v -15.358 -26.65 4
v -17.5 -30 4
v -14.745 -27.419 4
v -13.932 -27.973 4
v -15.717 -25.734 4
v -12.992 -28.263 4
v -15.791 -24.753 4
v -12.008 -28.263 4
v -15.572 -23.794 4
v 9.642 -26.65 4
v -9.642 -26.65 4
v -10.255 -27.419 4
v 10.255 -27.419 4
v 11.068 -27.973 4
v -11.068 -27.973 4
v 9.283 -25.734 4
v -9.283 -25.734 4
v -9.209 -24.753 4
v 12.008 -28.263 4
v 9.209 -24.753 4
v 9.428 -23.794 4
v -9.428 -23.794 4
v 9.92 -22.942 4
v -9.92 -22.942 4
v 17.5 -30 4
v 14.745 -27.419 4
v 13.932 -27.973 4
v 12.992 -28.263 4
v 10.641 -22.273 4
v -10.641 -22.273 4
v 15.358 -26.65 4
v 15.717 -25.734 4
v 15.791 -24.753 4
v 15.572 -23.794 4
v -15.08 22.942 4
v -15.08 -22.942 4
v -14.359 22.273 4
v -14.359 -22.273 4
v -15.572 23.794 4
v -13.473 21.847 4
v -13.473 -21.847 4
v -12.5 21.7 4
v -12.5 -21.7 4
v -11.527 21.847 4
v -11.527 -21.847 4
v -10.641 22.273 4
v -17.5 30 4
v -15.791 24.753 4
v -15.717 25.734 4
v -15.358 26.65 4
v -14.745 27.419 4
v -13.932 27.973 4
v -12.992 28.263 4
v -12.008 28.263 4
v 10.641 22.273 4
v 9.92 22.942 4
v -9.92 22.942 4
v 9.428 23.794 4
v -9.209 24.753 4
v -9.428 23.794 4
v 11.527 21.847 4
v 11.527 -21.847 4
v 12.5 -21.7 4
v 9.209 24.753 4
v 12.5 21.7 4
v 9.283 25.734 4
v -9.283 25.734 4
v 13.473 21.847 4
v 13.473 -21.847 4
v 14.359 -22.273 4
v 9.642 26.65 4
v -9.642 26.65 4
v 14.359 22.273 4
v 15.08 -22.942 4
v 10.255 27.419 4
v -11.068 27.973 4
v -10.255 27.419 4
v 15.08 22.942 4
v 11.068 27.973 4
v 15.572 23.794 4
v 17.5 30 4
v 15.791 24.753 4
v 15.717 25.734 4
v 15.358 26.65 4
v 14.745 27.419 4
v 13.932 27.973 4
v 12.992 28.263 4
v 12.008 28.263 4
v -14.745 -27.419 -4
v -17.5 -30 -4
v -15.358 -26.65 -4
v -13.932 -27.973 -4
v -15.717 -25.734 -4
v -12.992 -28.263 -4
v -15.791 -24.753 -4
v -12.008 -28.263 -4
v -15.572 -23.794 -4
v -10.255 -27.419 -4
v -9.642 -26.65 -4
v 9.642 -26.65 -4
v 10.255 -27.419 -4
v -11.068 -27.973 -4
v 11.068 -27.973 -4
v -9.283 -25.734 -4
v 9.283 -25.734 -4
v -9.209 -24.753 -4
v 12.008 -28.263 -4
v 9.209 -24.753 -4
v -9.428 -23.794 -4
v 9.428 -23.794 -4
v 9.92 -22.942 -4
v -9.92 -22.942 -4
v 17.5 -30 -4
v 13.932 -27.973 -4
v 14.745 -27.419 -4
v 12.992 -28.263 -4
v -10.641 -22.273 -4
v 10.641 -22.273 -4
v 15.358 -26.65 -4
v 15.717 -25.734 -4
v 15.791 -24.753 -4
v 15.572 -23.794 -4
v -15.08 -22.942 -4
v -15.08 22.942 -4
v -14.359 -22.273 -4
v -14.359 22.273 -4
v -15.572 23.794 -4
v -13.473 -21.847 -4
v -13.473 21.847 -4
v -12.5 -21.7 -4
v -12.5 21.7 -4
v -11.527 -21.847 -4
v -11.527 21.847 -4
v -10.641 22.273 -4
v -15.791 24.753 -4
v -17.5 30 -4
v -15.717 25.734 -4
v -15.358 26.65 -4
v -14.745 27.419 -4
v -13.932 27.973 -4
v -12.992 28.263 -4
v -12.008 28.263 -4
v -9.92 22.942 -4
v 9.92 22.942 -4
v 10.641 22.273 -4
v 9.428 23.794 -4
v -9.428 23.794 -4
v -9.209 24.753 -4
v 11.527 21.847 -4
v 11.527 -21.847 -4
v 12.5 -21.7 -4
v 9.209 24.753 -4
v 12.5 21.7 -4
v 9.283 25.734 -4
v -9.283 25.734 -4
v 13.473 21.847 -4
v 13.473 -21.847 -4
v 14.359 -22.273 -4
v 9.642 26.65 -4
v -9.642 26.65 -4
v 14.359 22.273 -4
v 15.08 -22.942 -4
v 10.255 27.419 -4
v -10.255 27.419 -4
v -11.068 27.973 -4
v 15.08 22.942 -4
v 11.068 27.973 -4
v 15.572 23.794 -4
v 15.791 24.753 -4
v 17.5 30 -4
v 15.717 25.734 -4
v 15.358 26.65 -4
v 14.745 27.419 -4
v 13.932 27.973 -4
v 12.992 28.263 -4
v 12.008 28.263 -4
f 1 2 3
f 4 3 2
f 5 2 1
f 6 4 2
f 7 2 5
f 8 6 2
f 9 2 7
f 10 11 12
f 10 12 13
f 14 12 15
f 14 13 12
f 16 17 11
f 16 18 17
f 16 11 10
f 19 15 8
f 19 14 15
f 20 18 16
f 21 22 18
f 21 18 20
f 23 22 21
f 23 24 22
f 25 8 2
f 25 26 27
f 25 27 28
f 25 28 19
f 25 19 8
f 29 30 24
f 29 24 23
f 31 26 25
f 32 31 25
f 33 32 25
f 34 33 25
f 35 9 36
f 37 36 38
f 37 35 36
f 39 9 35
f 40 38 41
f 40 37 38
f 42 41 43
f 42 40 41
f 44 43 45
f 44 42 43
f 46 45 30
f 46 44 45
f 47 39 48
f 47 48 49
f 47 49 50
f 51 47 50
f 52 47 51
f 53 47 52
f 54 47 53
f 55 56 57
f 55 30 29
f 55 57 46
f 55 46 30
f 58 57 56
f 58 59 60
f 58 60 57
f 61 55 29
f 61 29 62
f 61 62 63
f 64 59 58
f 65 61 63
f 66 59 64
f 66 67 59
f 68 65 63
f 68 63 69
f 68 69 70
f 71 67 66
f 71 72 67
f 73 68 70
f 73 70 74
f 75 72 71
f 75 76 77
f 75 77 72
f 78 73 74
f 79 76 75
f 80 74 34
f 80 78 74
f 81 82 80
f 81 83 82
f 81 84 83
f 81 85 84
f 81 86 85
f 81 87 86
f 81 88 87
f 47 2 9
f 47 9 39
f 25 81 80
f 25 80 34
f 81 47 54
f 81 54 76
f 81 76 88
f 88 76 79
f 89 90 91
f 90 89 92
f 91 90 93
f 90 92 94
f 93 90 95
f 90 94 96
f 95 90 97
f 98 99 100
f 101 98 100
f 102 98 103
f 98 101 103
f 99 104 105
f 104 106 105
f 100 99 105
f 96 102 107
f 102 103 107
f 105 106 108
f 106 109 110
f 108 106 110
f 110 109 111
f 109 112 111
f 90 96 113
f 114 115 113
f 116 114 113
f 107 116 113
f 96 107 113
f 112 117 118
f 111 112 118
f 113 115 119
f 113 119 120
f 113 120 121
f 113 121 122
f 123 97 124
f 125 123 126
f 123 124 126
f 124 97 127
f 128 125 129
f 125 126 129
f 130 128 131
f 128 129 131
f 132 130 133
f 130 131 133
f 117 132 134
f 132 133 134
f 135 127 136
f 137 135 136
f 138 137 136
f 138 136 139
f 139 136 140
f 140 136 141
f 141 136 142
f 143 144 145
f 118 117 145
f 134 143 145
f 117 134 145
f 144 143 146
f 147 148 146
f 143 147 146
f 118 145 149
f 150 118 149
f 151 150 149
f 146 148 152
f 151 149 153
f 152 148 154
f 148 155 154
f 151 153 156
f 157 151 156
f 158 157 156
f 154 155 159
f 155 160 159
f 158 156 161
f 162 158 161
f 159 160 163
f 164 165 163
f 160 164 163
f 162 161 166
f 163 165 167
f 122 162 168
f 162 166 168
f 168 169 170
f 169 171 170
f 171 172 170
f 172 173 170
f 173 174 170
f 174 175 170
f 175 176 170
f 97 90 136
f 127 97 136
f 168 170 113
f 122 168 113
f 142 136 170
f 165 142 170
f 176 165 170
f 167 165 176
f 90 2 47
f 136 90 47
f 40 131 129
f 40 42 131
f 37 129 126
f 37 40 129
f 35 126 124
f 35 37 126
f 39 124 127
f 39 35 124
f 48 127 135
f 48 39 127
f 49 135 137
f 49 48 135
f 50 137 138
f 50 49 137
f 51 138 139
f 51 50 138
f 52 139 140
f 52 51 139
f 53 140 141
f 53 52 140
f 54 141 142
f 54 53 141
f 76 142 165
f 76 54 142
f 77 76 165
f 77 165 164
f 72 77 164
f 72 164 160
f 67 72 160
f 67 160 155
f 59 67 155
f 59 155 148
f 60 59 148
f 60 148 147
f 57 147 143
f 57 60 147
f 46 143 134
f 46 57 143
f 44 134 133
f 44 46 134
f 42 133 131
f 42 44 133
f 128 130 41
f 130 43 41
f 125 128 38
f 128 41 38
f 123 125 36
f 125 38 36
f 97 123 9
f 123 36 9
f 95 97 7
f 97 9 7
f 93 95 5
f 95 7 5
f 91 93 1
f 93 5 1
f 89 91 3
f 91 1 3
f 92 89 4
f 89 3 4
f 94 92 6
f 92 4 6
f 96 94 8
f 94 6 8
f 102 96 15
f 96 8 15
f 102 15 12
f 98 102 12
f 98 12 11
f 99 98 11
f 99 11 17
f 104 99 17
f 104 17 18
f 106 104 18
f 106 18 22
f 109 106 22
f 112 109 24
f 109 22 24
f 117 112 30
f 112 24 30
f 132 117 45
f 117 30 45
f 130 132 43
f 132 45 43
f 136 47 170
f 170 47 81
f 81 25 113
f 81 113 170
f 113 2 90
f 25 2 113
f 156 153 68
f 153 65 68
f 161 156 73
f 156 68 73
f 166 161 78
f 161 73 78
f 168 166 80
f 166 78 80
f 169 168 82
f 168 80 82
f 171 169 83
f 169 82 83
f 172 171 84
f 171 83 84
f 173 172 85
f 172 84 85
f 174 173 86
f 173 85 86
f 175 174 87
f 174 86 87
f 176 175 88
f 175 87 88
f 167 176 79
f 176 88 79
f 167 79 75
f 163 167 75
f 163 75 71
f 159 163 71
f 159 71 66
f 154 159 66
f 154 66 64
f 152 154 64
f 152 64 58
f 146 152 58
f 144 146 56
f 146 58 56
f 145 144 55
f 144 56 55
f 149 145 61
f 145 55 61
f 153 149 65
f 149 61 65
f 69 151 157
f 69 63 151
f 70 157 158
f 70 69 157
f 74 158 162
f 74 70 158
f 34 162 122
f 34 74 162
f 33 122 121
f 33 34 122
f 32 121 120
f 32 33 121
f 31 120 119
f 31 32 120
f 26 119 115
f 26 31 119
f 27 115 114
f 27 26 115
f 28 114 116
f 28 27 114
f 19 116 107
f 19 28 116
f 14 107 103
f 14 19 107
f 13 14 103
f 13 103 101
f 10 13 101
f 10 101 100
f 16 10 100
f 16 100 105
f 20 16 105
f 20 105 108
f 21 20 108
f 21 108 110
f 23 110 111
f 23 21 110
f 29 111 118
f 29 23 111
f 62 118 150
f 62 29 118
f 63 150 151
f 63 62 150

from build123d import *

# Parameters (mm, degrees)
SKETCH1_W           = 35
SKETCH1_H           = 60
BOSS_EXTRUDE1_DEPTH = 4


with BuildPart() as part:
    # Sketch1 → Boss-Extrude1 (new, symmetric)
    with BuildSketch(Plane.XY):
        Rectangle(SKETCH1_W, SKETCH1_H)
    extrude(amount=BOSS_EXTRUDE1_DEPTH, both=True)

    # Sketch3 → M6 Clearance Hole1 (revolve, cut)
    with BuildSketch(Plane(origin=(-12.5, 25, 4), x_dir=(0, -1, 0), z_dir=(1, 0, 0))):
        Polygon((0, 0), (0, 9.982840043), (3.3, 8), (3.3, 0), align=None)
    m6_clearance_hole1 = revolve(axis=Axis((-12.5, 25, 10.35), (0, 0, -1)), mode=Mode.SUBTRACT)

    # Mirror1: M6 Clearance Hole1 across plane
    add(m6_clearance_hole1.mirror(Plane(origin=(0, 0, 0), x_dir=(0, 0, 1), z_dir=(1, 0, 0))), mode=Mode.SUBTRACT)

    # Mirror2: M6 Clearance Hole1 across plane
    add(m6_clearance_hole1.mirror(Plane.ZX), mode=Mode.SUBTRACT)

    # Mirror2 copy 1 sketch → Mirror2 copy 1 (revolve, cut)
    with BuildSketch(Plane(origin=(12.5, -25, 4), x_dir=(0, 1, 0), z_dir=(-1, 0, 0))):
        Polygon((0, 0), (0, 9.982840043), (3.3, 8), (3.3, 0), align=None)
    revolve(axis=Axis((12.5, -25, 10.35), (0, 0, -1)), mode=Mode.SUBTRACT)


solid = part.part
